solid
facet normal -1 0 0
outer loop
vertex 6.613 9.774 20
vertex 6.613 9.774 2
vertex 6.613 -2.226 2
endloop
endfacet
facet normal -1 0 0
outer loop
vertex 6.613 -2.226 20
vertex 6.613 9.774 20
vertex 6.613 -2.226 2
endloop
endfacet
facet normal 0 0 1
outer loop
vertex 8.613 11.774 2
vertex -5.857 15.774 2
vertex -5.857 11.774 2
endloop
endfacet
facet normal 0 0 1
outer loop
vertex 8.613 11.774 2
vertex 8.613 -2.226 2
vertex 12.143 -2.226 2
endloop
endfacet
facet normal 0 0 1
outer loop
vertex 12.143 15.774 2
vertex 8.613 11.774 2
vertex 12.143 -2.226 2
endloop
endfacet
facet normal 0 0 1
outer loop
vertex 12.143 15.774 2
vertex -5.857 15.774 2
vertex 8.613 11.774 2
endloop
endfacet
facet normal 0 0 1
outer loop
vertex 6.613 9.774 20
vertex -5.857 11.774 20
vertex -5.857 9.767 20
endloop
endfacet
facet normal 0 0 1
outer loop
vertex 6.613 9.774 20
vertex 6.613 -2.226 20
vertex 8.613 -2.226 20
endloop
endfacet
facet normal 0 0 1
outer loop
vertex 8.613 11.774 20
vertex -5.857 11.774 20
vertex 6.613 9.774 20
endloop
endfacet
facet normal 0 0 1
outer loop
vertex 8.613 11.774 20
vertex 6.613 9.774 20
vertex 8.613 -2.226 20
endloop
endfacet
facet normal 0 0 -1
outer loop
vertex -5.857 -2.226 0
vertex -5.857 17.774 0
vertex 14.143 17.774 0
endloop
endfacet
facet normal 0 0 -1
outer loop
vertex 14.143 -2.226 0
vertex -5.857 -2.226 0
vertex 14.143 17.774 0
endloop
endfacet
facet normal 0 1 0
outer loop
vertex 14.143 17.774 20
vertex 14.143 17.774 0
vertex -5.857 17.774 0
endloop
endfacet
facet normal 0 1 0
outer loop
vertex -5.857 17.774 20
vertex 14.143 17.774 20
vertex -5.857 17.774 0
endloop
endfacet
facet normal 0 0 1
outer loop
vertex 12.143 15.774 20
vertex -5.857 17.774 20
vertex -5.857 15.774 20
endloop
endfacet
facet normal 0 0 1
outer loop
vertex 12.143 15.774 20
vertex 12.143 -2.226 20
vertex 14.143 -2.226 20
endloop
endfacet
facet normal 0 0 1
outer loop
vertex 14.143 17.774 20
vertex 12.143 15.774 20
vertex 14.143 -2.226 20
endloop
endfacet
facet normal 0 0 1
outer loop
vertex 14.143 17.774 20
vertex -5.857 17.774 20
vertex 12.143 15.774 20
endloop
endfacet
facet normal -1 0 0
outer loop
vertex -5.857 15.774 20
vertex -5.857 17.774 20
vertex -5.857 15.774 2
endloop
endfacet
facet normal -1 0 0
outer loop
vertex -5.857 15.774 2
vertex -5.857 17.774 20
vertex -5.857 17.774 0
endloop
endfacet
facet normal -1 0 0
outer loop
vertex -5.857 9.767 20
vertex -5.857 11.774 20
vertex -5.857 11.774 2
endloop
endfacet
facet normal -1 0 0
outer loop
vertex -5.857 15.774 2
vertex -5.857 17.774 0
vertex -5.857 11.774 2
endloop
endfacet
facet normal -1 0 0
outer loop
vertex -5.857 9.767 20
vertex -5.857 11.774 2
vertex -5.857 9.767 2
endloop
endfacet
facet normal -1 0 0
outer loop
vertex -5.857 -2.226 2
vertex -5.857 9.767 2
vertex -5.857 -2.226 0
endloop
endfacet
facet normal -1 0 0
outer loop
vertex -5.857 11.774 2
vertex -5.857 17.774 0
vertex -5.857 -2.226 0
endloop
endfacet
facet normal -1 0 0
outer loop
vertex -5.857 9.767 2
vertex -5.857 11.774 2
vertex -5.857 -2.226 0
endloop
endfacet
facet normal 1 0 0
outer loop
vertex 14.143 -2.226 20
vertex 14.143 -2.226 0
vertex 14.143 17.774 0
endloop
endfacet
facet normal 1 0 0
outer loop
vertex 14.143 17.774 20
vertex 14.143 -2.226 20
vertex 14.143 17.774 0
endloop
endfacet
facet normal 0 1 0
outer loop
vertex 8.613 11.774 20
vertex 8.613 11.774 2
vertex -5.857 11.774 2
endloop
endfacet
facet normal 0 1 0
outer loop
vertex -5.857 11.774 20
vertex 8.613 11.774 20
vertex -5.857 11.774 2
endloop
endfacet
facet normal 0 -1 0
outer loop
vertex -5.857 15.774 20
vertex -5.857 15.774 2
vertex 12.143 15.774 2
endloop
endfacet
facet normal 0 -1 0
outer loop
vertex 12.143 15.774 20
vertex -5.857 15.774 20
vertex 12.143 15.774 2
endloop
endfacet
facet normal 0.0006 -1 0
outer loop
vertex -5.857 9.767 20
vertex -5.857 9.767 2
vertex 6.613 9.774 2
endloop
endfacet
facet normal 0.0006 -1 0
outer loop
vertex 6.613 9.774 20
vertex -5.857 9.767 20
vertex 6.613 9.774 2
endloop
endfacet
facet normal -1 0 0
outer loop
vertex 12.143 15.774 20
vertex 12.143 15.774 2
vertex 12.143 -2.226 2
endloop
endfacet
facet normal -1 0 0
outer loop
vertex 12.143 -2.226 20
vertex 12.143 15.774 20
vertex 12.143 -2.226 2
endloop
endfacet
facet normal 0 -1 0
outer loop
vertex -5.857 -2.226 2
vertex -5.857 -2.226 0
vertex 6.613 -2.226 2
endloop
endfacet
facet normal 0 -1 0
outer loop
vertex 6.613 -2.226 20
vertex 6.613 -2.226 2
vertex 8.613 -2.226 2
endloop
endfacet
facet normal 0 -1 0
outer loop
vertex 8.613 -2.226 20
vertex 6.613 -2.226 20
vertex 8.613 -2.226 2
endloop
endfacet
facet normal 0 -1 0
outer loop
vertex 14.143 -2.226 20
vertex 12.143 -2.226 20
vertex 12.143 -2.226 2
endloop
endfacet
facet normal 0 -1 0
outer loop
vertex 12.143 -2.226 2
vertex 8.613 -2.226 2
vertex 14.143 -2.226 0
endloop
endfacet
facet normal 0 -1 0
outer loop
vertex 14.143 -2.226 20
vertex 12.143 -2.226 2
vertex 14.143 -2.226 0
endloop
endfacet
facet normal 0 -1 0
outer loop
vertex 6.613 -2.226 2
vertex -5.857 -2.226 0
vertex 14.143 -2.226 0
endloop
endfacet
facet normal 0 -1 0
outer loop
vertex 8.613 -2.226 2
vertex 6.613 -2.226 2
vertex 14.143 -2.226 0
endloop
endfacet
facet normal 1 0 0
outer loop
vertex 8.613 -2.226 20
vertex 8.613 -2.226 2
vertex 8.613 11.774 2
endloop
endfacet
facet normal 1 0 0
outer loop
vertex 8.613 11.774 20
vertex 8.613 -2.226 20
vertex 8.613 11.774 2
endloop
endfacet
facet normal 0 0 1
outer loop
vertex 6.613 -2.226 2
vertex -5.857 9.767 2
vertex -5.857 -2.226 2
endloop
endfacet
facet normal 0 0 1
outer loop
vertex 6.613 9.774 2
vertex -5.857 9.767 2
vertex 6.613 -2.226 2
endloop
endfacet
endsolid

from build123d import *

# Parameters (mm, degrees)
F0_W     = 20
F0_H     = 20
F1_DEPTH = 2
F3_DEPTH = 18
F5_DEPTH = 18


with BuildPart() as f1:
    # F0 (on Top) → F1 (new body)
    with BuildSketch(Plane.XY):
        with Locations((4.142752, 7.774246)):
            Rectangle(F0_W, F0_H)
    extrude(amount=F1_DEPTH)

    # F2 (on face) → F3 (join)
    with BuildSketch(Plane.XY.offset(2)):
        Polygon((14.142752, 17.774246), (-5.857248, 17.774246), (-5.857248, 15.774246), (12.142752, 15.774246), (12.142752, -2.225754), (14.142752, -2.225754), align=None)
    extrude(amount=F3_DEPTH)

    # F4 (on face) → F5 (join)
    with BuildSketch(Plane.XY.offset(2)):
        Polygon((8.142752, 11.774246), (-5.857248, 11.774246), (-5.857248, 9.767495), (6.612573, 9.774246), (6.612573, -2.225754), (8.612573, -2.225754), (8.612573, 11.774246), align=None)
    extrude(amount=F5_DEPTH)


solid = f1.part
